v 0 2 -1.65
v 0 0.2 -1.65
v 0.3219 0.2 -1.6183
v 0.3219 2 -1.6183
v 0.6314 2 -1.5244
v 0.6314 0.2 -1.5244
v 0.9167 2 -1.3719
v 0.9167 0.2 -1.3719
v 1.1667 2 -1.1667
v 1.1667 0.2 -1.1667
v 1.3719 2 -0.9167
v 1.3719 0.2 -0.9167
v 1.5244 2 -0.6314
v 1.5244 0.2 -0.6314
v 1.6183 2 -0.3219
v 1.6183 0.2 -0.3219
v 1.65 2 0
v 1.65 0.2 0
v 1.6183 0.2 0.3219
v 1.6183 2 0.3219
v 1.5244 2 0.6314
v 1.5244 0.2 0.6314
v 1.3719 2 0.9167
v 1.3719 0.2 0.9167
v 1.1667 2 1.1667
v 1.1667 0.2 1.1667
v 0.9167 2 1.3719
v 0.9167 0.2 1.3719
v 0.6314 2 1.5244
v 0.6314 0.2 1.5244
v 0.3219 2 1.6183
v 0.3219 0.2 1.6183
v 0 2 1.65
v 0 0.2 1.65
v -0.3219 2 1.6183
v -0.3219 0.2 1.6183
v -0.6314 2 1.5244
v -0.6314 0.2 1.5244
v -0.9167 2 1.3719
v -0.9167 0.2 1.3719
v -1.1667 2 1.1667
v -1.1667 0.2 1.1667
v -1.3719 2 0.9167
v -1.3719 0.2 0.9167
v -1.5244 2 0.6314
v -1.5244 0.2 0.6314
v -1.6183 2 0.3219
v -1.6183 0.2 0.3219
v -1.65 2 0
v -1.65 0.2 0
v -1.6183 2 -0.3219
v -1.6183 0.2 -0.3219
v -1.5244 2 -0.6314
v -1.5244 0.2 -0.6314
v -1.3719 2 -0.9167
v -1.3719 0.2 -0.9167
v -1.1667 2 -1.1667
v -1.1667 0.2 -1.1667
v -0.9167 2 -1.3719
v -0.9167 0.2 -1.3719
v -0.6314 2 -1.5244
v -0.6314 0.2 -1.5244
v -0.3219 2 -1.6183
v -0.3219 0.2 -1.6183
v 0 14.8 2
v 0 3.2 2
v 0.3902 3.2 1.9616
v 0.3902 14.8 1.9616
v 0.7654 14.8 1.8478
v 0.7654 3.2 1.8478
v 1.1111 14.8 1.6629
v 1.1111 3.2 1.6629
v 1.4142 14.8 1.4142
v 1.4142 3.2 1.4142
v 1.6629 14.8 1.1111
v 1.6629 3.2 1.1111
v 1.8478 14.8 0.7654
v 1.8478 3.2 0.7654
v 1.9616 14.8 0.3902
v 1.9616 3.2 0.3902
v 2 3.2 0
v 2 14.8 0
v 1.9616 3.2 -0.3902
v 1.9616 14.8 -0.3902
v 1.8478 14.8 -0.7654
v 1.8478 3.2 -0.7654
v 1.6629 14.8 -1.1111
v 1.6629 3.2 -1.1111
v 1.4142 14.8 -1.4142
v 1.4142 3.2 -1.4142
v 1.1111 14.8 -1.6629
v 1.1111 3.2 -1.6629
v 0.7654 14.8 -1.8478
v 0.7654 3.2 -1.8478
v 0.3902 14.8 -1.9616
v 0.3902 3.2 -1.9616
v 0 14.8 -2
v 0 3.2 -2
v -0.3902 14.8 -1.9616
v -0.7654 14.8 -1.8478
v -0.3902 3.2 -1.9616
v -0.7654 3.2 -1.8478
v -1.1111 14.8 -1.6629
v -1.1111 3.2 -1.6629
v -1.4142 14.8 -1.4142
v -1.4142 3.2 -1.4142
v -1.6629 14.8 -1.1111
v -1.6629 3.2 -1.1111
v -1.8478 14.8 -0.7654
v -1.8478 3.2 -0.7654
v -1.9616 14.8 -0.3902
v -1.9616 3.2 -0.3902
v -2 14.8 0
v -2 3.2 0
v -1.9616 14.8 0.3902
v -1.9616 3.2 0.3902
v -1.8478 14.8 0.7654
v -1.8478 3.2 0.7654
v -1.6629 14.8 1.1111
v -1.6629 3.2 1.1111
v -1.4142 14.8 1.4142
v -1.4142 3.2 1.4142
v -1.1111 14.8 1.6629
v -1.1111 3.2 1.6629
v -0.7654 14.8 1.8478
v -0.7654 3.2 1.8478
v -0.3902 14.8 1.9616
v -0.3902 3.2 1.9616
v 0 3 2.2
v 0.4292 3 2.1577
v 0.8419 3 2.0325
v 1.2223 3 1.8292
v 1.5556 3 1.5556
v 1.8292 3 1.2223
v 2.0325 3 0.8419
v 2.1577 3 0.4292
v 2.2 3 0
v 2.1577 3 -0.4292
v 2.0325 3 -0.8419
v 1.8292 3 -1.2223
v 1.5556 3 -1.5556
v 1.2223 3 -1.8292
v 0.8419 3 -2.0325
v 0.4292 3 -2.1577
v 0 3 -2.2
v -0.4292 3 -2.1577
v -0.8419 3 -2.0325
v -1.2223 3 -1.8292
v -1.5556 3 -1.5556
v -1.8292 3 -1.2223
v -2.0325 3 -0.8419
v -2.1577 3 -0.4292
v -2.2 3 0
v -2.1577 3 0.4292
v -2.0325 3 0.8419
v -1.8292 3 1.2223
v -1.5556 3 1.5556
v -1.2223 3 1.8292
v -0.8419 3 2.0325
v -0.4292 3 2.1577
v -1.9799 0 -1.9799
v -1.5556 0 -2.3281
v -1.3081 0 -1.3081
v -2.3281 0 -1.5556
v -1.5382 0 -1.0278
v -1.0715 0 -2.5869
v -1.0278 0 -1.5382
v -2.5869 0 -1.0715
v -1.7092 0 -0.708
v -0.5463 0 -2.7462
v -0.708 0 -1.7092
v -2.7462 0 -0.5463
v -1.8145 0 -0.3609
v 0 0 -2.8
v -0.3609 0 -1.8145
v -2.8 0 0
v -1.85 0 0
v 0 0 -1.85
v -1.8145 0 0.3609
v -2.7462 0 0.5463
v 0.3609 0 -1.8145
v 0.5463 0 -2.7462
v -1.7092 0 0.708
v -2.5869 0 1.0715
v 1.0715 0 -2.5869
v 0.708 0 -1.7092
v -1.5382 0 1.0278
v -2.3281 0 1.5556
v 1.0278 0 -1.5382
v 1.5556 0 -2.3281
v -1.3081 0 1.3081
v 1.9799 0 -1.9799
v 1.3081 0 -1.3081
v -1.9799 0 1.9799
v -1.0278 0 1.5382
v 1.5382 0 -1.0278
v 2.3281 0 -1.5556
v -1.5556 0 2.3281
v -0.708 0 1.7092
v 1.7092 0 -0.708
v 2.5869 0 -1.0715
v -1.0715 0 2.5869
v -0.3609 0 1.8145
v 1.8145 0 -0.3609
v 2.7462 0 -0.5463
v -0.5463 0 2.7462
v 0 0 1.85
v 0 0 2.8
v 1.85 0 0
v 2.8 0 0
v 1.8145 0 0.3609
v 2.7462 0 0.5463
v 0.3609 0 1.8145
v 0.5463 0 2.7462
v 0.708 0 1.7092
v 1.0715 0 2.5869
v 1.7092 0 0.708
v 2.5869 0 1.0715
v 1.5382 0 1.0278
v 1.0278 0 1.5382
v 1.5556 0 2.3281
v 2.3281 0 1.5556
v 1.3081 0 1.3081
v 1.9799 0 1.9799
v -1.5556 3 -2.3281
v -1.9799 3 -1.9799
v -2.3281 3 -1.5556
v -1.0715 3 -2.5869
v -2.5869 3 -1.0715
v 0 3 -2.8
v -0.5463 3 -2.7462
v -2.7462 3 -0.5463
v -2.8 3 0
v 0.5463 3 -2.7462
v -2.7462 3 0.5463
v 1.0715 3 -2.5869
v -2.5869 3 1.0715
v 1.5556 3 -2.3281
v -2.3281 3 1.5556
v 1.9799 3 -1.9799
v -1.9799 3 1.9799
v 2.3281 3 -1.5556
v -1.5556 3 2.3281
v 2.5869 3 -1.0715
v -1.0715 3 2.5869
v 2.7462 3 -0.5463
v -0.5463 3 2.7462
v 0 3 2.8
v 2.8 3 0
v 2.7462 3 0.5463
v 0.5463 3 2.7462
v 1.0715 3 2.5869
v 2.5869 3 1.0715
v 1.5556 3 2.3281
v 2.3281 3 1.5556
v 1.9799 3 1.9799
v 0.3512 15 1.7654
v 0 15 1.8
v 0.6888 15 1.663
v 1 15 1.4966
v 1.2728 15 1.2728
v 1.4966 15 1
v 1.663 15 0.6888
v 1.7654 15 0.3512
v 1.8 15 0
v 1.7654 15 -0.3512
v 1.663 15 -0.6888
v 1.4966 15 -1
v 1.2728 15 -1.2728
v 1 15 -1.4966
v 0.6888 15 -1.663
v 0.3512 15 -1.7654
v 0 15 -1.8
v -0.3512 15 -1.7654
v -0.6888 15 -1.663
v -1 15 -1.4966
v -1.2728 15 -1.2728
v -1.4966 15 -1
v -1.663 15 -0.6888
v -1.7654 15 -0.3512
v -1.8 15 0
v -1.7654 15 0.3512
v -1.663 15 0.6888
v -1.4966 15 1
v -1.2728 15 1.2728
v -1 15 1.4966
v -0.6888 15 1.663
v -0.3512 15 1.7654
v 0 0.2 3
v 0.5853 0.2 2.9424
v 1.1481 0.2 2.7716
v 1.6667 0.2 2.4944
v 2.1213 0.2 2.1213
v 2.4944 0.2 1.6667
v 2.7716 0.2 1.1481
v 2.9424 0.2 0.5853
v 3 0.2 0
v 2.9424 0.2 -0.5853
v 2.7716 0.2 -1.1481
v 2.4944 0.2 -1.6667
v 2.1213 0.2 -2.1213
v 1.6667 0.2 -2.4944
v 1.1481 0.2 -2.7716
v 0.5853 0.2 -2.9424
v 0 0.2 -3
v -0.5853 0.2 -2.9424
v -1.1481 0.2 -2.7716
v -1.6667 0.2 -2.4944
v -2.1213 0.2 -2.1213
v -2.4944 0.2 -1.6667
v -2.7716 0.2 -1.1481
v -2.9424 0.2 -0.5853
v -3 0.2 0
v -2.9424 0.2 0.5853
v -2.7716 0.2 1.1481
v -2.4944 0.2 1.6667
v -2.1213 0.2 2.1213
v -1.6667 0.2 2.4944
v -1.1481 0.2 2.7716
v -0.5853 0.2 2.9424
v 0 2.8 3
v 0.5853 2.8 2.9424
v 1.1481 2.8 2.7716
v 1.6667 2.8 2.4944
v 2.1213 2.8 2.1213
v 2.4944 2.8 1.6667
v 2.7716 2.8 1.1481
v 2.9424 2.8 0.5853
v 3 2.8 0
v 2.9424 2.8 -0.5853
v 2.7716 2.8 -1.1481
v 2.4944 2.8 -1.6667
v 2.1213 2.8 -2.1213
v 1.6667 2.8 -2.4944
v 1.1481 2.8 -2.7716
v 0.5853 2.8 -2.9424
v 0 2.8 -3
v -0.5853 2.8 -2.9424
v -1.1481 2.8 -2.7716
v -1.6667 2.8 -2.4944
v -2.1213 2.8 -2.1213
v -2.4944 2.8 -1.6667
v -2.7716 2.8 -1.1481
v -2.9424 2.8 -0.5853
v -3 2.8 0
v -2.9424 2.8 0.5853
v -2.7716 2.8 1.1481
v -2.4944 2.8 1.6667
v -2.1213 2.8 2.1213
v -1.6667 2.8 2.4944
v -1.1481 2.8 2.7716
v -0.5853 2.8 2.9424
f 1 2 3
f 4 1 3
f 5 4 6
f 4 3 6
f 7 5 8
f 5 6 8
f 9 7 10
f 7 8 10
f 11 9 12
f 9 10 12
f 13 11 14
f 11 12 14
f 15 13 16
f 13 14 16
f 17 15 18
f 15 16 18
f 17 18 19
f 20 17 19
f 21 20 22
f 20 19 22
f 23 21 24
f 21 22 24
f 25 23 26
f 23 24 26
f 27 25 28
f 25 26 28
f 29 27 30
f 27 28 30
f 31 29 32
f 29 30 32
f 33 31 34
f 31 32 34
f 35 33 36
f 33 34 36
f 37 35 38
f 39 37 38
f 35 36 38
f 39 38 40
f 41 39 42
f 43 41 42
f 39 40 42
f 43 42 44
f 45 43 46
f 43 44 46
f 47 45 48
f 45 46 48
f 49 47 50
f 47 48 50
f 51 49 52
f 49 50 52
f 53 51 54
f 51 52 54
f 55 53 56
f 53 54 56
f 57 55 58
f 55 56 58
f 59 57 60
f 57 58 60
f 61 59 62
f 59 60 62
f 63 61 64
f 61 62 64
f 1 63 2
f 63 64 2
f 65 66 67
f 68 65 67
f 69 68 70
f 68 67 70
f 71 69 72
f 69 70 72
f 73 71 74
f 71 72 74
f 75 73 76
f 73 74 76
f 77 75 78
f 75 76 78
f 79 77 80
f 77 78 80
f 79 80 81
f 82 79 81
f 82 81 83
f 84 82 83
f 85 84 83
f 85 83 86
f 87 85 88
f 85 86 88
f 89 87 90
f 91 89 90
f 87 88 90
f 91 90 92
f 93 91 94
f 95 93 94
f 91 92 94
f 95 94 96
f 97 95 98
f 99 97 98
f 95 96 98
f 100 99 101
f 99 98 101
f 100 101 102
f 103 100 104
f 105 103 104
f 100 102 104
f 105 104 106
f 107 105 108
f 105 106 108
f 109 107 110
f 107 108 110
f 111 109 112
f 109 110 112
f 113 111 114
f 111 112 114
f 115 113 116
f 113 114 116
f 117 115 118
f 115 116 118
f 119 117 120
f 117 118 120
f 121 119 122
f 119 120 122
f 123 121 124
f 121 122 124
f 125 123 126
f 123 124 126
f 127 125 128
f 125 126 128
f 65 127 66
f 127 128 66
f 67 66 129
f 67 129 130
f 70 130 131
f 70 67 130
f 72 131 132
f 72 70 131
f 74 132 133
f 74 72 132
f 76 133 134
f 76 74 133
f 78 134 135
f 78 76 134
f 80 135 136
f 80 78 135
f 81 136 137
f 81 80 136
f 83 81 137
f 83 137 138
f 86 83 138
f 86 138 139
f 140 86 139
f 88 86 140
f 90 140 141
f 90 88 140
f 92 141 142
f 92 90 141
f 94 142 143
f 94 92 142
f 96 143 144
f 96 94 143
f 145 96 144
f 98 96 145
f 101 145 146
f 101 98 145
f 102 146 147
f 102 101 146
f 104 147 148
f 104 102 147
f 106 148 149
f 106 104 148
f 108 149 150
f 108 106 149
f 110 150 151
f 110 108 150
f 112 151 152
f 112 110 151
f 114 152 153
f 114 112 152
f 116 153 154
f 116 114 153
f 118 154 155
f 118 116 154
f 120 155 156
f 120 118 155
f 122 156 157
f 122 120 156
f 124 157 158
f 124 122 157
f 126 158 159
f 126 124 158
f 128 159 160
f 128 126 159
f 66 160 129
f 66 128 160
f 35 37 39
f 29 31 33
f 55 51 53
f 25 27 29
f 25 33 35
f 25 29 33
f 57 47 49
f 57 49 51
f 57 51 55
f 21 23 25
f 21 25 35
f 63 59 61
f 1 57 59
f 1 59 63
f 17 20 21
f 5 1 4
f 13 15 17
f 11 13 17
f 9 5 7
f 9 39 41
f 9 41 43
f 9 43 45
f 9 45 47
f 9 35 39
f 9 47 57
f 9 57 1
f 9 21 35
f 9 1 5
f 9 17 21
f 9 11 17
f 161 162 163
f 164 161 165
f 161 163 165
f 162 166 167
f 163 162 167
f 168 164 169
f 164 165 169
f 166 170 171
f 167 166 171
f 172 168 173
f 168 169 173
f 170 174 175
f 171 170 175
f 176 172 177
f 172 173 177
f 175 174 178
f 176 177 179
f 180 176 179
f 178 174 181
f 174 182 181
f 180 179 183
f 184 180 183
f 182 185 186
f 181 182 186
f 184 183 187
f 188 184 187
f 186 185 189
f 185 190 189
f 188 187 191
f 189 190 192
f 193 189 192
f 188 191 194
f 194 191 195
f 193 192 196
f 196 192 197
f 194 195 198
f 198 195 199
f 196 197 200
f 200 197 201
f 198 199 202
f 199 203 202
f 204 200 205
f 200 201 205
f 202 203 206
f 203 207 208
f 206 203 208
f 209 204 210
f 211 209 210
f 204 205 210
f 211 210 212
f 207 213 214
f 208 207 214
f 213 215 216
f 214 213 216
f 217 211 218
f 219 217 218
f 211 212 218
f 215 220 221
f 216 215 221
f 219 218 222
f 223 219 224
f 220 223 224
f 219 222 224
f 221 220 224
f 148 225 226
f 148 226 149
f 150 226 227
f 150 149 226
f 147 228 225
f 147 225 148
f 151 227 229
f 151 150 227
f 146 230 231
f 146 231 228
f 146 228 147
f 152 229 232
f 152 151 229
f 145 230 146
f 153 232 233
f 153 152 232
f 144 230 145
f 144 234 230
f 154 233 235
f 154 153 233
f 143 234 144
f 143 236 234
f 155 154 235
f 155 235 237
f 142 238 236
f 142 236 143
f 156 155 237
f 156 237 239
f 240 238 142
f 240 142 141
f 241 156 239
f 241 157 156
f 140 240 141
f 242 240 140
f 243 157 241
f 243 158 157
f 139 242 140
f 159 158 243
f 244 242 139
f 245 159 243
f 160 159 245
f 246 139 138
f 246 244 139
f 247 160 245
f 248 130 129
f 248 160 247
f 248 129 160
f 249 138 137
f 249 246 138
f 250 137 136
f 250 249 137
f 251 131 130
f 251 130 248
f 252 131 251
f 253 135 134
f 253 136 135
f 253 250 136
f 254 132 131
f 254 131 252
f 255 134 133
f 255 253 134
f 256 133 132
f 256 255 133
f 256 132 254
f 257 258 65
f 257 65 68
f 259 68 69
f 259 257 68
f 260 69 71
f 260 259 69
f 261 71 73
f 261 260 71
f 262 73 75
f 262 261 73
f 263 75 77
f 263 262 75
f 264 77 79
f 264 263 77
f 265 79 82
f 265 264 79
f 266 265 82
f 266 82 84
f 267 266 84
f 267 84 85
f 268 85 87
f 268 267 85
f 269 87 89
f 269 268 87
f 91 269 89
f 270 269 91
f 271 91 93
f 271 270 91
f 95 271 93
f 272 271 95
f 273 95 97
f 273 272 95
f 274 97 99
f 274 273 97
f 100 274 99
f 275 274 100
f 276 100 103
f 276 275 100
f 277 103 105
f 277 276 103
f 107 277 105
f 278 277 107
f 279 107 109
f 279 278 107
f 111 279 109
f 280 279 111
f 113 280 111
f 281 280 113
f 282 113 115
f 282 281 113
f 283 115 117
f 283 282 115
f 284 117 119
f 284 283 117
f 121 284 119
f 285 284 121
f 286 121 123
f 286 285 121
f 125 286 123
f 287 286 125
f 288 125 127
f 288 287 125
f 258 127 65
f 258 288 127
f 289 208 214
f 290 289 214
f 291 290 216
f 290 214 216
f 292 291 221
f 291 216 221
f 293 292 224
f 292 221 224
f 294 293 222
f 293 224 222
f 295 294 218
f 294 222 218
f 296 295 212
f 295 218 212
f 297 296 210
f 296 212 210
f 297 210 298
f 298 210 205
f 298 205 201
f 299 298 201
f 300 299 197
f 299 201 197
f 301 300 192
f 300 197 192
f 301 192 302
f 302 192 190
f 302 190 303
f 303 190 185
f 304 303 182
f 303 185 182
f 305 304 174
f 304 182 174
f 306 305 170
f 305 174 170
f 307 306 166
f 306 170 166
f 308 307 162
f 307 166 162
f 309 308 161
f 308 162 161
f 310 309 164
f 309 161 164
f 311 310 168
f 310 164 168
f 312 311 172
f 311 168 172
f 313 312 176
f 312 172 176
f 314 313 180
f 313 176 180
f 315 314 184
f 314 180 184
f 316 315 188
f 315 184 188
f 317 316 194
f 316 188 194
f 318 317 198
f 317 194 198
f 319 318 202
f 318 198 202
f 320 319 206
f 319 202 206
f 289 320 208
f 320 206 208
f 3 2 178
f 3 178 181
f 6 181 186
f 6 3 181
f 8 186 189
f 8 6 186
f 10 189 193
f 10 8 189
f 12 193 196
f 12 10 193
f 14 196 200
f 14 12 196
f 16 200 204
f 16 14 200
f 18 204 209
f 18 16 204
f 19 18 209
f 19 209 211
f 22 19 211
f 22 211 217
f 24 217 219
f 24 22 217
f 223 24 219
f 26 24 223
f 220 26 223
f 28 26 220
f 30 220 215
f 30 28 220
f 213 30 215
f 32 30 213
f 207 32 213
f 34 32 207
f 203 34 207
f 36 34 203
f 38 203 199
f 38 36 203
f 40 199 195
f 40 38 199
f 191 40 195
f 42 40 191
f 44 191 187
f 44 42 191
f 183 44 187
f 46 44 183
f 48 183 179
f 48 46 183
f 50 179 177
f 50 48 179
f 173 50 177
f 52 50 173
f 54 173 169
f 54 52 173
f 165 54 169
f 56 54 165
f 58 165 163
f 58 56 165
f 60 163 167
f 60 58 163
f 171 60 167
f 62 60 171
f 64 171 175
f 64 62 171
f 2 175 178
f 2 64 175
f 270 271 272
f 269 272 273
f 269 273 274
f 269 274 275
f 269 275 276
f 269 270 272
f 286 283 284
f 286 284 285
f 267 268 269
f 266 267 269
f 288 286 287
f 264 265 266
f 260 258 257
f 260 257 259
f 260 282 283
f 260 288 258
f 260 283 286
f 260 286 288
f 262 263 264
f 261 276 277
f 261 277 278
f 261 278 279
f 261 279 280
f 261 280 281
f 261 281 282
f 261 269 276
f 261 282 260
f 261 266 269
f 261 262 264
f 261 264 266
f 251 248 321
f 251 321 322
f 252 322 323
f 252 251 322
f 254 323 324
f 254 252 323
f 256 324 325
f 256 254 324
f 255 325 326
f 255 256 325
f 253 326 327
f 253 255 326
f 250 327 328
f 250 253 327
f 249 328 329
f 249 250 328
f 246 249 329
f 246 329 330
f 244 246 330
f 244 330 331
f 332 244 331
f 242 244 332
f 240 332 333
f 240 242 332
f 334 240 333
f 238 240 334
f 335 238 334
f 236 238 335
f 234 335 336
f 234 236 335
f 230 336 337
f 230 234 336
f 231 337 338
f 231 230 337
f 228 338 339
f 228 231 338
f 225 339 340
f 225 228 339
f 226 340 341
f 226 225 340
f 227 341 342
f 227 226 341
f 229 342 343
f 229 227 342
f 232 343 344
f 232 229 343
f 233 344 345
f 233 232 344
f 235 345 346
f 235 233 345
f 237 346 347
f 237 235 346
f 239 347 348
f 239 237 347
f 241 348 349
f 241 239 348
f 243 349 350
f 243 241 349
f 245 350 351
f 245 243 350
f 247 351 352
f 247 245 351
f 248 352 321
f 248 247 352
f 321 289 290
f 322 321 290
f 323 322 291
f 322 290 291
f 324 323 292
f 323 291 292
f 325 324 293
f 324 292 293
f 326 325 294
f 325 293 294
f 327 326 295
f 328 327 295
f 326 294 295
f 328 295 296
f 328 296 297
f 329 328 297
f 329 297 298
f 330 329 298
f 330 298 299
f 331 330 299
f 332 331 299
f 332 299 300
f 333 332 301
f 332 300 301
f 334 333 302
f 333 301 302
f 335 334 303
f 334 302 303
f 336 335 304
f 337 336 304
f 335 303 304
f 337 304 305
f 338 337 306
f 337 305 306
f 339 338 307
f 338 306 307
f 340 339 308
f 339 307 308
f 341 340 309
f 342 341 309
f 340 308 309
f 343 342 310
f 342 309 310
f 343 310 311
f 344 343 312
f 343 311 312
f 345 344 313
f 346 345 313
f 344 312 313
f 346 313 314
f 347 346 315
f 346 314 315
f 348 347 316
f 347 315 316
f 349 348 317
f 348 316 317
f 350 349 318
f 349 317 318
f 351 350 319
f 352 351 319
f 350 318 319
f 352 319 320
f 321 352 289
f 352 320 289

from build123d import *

# Parameters (mm, degrees)
ESQUISSE1_R             = 3
BOSS_EXTRU_1_DEPTH      = 3
ESQUISSE2_R             = 2
BOSS_EXTRU_2_DEPTH      = 12
ESQUISSE3_R             = 1.65
ENL_V_MAT_EXTRU_1_DEPTH = 2
CHANFREIN1_SIZE         = 0.2


with BuildPart() as part:
    # Esquisse1 → Boss.-Extru.1 (new body)
    with BuildSketch(Plane(origin=(0, 0, 0), x_dir=(1, 0, 0), z_dir=(0, 1, 0))):
        with Locations(Location((0, 0, 0), (0, 0, 270))):
            Circle(ESQUISSE1_R)
    extrude(amount=BOSS_EXTRU_1_DEPTH)

    # Esquisse2 → Boss.-Extru.2 (add)
    with BuildSketch(Plane(origin=(0, 3, 0), x_dir=(1, 0, 0), z_dir=(0, 1, 0))):
        with Locations(Location((0, 0, 0), (0, 0, 270))):
            Circle(ESQUISSE2_R)
    extrude(amount=BOSS_EXTRU_2_DEPTH)

    # Esquisse3 → Enlèv. mat.-Extru.1 (cut)
    with BuildSketch(Plane.XZ):
        with Locations(Location((0, 0, 0), (0, 0, 270))):
            Circle(ESQUISSE3_R)
    extrude(amount=-ENL_V_MAT_EXTRU_1_DEPTH, mode=Mode.SUBTRACT)

    # Chanfrein1
    chanfrein1_edges = [part.edges().sort_by_distance(p)[0] for p in [
        (0, 0, 1.65),
        (0, 0, -3),
        (0, 3, -3),
        (0, 3, -2),
        (0, 15, -2),
    ]]
    chamfer(chanfrein1_edges, length=CHANFREIN1_SIZE)


solid = part.part
